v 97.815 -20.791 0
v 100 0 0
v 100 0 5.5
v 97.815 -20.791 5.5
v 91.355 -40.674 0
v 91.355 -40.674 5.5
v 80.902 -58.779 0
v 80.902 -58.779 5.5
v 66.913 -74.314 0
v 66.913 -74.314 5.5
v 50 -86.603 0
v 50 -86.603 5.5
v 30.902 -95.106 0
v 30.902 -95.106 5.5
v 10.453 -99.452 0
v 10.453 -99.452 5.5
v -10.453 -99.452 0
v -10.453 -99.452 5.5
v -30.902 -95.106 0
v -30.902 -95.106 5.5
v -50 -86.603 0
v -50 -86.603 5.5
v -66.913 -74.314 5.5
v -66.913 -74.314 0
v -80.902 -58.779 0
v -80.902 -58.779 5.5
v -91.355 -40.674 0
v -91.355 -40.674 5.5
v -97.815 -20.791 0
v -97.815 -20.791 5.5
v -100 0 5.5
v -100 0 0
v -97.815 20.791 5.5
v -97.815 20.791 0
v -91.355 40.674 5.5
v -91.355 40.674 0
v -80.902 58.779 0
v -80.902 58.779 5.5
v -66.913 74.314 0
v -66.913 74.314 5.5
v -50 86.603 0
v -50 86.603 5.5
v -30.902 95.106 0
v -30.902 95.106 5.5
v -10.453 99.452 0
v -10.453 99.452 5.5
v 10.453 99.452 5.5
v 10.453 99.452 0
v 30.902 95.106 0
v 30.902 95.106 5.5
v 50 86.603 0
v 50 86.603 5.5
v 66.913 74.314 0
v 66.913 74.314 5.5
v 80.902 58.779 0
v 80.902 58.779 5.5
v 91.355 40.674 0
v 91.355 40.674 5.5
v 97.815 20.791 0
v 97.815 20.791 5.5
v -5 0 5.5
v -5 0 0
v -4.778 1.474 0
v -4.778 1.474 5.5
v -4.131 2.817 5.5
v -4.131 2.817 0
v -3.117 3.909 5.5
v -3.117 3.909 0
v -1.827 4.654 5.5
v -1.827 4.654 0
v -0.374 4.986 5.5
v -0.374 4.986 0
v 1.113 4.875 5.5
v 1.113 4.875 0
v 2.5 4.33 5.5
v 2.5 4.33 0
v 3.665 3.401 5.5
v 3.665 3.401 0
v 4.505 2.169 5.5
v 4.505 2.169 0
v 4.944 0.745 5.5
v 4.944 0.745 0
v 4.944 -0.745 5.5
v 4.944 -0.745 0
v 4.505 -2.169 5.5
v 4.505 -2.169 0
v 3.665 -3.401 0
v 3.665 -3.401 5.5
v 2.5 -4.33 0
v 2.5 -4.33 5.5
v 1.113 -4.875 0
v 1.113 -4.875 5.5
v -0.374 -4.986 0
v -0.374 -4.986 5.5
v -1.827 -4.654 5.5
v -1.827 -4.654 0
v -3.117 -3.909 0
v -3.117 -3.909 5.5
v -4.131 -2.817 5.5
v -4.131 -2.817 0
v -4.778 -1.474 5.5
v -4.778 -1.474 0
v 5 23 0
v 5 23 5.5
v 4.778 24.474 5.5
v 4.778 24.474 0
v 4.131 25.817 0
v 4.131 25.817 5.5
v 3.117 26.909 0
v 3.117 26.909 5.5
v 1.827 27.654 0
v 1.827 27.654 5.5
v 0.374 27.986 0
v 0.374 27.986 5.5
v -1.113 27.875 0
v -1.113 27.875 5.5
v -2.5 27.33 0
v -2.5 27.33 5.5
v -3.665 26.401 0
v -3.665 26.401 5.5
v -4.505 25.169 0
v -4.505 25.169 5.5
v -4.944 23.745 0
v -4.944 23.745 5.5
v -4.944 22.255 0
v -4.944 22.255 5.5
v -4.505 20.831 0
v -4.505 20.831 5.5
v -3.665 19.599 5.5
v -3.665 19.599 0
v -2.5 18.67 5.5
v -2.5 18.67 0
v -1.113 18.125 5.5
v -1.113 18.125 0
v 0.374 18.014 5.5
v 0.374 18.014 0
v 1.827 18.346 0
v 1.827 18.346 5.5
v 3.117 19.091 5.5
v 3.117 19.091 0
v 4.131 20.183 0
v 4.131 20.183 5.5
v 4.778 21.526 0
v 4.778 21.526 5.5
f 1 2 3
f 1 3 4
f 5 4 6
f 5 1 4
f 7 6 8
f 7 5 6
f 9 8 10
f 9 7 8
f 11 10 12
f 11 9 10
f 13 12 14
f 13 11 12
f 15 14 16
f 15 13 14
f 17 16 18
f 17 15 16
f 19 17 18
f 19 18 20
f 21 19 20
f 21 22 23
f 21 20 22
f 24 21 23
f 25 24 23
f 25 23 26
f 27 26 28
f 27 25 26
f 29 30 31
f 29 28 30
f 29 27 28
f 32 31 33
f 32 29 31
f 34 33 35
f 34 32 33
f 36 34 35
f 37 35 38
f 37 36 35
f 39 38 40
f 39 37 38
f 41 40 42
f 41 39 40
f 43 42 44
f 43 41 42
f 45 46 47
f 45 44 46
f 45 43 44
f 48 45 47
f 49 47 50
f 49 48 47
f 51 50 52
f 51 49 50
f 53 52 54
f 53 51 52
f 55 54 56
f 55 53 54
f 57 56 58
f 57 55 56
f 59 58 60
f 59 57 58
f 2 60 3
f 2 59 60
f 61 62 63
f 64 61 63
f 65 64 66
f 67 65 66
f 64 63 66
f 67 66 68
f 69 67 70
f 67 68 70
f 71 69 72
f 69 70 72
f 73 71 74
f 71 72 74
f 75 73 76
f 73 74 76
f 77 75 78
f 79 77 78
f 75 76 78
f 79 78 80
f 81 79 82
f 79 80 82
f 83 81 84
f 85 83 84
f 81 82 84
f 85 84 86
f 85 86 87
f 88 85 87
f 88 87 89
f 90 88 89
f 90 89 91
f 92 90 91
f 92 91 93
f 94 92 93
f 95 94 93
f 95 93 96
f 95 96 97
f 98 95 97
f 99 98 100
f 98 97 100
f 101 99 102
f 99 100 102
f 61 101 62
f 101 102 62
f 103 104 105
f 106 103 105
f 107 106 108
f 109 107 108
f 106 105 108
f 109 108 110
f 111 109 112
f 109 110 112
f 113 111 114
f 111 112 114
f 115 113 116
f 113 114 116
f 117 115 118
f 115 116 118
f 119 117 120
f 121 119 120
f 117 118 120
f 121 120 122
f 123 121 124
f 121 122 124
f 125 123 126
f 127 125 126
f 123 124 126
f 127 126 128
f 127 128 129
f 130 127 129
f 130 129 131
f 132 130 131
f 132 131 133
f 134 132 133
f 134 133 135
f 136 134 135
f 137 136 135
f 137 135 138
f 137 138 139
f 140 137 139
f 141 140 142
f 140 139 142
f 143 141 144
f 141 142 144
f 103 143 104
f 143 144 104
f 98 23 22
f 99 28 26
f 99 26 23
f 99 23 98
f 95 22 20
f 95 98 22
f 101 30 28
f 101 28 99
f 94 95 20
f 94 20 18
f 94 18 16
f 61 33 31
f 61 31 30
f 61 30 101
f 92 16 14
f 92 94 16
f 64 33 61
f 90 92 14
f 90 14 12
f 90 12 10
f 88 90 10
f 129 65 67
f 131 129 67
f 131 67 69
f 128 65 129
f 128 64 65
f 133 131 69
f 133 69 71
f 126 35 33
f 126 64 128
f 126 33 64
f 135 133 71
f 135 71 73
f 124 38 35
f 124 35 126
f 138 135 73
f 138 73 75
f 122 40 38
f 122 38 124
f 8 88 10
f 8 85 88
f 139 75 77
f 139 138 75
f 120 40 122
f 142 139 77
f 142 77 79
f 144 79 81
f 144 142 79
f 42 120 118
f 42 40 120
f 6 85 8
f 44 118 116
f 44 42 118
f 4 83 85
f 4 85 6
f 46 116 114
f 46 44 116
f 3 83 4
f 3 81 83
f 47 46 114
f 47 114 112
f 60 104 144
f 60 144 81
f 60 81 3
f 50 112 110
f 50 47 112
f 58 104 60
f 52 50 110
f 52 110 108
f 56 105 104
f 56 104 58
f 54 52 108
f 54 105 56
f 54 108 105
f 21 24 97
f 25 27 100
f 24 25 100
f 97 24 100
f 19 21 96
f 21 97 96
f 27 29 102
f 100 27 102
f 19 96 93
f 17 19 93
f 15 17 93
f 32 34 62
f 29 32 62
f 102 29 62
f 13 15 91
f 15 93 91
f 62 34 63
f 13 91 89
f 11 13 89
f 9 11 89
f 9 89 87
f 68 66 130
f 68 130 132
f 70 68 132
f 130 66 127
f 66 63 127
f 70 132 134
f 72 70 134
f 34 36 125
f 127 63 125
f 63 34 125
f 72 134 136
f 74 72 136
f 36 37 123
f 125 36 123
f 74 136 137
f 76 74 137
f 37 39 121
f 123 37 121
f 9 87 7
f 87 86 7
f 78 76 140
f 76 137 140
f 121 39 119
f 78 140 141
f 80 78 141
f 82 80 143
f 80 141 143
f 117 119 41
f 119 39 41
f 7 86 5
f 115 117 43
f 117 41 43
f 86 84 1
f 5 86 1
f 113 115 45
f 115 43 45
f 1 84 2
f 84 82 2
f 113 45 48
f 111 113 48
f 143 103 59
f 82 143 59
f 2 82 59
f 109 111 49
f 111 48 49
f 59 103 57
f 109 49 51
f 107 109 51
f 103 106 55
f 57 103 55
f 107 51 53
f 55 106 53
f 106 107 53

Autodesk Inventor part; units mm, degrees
ref_plane "YZ Plane" through (0, 0, 0) normal (1, 0, 0) x (0, 1, 0)
ref_plane "XZ Plane" through (0, 0, 0) normal (0, 1, 0) x (-1, 0, 0)
ref_plane "XY Plane" through (0, 0, 0) normal (0, 0, 1) x (1, 0, 0)
sketch "Sketch1" plane through (0, 0, 0) normal (0, 0, 1) x (1, 0, 0)
  circle A0 centre (0, 0) radius 100
  dimension "d8" = 200
extrude "Extrusion1" add sketch "Sketch1" along normal blind 5.5
sketch "Sketch2" plane through (0, 0, 5.5) normal (0, 0, 1) x (1, 0, 0)
  circle A0 centre (0, 23) radius 5
  point P0 (0, 0)
  dimension "d2" = 10
  dimension "d9" = 23
extrude "Extrusion2" cut sketch "Sketch2" against normal blind 100
sketch "Sketch3" plane through (0, 0, 0) normal (0, 0, -1) x (-1, 0, 0)
  circle A0 centre (0, 0) radius 5
  dimension "d5" = 10
extrude "Extrusion3" cut sketch "Sketch3" against normal blind 10
properties part number "pulley"
